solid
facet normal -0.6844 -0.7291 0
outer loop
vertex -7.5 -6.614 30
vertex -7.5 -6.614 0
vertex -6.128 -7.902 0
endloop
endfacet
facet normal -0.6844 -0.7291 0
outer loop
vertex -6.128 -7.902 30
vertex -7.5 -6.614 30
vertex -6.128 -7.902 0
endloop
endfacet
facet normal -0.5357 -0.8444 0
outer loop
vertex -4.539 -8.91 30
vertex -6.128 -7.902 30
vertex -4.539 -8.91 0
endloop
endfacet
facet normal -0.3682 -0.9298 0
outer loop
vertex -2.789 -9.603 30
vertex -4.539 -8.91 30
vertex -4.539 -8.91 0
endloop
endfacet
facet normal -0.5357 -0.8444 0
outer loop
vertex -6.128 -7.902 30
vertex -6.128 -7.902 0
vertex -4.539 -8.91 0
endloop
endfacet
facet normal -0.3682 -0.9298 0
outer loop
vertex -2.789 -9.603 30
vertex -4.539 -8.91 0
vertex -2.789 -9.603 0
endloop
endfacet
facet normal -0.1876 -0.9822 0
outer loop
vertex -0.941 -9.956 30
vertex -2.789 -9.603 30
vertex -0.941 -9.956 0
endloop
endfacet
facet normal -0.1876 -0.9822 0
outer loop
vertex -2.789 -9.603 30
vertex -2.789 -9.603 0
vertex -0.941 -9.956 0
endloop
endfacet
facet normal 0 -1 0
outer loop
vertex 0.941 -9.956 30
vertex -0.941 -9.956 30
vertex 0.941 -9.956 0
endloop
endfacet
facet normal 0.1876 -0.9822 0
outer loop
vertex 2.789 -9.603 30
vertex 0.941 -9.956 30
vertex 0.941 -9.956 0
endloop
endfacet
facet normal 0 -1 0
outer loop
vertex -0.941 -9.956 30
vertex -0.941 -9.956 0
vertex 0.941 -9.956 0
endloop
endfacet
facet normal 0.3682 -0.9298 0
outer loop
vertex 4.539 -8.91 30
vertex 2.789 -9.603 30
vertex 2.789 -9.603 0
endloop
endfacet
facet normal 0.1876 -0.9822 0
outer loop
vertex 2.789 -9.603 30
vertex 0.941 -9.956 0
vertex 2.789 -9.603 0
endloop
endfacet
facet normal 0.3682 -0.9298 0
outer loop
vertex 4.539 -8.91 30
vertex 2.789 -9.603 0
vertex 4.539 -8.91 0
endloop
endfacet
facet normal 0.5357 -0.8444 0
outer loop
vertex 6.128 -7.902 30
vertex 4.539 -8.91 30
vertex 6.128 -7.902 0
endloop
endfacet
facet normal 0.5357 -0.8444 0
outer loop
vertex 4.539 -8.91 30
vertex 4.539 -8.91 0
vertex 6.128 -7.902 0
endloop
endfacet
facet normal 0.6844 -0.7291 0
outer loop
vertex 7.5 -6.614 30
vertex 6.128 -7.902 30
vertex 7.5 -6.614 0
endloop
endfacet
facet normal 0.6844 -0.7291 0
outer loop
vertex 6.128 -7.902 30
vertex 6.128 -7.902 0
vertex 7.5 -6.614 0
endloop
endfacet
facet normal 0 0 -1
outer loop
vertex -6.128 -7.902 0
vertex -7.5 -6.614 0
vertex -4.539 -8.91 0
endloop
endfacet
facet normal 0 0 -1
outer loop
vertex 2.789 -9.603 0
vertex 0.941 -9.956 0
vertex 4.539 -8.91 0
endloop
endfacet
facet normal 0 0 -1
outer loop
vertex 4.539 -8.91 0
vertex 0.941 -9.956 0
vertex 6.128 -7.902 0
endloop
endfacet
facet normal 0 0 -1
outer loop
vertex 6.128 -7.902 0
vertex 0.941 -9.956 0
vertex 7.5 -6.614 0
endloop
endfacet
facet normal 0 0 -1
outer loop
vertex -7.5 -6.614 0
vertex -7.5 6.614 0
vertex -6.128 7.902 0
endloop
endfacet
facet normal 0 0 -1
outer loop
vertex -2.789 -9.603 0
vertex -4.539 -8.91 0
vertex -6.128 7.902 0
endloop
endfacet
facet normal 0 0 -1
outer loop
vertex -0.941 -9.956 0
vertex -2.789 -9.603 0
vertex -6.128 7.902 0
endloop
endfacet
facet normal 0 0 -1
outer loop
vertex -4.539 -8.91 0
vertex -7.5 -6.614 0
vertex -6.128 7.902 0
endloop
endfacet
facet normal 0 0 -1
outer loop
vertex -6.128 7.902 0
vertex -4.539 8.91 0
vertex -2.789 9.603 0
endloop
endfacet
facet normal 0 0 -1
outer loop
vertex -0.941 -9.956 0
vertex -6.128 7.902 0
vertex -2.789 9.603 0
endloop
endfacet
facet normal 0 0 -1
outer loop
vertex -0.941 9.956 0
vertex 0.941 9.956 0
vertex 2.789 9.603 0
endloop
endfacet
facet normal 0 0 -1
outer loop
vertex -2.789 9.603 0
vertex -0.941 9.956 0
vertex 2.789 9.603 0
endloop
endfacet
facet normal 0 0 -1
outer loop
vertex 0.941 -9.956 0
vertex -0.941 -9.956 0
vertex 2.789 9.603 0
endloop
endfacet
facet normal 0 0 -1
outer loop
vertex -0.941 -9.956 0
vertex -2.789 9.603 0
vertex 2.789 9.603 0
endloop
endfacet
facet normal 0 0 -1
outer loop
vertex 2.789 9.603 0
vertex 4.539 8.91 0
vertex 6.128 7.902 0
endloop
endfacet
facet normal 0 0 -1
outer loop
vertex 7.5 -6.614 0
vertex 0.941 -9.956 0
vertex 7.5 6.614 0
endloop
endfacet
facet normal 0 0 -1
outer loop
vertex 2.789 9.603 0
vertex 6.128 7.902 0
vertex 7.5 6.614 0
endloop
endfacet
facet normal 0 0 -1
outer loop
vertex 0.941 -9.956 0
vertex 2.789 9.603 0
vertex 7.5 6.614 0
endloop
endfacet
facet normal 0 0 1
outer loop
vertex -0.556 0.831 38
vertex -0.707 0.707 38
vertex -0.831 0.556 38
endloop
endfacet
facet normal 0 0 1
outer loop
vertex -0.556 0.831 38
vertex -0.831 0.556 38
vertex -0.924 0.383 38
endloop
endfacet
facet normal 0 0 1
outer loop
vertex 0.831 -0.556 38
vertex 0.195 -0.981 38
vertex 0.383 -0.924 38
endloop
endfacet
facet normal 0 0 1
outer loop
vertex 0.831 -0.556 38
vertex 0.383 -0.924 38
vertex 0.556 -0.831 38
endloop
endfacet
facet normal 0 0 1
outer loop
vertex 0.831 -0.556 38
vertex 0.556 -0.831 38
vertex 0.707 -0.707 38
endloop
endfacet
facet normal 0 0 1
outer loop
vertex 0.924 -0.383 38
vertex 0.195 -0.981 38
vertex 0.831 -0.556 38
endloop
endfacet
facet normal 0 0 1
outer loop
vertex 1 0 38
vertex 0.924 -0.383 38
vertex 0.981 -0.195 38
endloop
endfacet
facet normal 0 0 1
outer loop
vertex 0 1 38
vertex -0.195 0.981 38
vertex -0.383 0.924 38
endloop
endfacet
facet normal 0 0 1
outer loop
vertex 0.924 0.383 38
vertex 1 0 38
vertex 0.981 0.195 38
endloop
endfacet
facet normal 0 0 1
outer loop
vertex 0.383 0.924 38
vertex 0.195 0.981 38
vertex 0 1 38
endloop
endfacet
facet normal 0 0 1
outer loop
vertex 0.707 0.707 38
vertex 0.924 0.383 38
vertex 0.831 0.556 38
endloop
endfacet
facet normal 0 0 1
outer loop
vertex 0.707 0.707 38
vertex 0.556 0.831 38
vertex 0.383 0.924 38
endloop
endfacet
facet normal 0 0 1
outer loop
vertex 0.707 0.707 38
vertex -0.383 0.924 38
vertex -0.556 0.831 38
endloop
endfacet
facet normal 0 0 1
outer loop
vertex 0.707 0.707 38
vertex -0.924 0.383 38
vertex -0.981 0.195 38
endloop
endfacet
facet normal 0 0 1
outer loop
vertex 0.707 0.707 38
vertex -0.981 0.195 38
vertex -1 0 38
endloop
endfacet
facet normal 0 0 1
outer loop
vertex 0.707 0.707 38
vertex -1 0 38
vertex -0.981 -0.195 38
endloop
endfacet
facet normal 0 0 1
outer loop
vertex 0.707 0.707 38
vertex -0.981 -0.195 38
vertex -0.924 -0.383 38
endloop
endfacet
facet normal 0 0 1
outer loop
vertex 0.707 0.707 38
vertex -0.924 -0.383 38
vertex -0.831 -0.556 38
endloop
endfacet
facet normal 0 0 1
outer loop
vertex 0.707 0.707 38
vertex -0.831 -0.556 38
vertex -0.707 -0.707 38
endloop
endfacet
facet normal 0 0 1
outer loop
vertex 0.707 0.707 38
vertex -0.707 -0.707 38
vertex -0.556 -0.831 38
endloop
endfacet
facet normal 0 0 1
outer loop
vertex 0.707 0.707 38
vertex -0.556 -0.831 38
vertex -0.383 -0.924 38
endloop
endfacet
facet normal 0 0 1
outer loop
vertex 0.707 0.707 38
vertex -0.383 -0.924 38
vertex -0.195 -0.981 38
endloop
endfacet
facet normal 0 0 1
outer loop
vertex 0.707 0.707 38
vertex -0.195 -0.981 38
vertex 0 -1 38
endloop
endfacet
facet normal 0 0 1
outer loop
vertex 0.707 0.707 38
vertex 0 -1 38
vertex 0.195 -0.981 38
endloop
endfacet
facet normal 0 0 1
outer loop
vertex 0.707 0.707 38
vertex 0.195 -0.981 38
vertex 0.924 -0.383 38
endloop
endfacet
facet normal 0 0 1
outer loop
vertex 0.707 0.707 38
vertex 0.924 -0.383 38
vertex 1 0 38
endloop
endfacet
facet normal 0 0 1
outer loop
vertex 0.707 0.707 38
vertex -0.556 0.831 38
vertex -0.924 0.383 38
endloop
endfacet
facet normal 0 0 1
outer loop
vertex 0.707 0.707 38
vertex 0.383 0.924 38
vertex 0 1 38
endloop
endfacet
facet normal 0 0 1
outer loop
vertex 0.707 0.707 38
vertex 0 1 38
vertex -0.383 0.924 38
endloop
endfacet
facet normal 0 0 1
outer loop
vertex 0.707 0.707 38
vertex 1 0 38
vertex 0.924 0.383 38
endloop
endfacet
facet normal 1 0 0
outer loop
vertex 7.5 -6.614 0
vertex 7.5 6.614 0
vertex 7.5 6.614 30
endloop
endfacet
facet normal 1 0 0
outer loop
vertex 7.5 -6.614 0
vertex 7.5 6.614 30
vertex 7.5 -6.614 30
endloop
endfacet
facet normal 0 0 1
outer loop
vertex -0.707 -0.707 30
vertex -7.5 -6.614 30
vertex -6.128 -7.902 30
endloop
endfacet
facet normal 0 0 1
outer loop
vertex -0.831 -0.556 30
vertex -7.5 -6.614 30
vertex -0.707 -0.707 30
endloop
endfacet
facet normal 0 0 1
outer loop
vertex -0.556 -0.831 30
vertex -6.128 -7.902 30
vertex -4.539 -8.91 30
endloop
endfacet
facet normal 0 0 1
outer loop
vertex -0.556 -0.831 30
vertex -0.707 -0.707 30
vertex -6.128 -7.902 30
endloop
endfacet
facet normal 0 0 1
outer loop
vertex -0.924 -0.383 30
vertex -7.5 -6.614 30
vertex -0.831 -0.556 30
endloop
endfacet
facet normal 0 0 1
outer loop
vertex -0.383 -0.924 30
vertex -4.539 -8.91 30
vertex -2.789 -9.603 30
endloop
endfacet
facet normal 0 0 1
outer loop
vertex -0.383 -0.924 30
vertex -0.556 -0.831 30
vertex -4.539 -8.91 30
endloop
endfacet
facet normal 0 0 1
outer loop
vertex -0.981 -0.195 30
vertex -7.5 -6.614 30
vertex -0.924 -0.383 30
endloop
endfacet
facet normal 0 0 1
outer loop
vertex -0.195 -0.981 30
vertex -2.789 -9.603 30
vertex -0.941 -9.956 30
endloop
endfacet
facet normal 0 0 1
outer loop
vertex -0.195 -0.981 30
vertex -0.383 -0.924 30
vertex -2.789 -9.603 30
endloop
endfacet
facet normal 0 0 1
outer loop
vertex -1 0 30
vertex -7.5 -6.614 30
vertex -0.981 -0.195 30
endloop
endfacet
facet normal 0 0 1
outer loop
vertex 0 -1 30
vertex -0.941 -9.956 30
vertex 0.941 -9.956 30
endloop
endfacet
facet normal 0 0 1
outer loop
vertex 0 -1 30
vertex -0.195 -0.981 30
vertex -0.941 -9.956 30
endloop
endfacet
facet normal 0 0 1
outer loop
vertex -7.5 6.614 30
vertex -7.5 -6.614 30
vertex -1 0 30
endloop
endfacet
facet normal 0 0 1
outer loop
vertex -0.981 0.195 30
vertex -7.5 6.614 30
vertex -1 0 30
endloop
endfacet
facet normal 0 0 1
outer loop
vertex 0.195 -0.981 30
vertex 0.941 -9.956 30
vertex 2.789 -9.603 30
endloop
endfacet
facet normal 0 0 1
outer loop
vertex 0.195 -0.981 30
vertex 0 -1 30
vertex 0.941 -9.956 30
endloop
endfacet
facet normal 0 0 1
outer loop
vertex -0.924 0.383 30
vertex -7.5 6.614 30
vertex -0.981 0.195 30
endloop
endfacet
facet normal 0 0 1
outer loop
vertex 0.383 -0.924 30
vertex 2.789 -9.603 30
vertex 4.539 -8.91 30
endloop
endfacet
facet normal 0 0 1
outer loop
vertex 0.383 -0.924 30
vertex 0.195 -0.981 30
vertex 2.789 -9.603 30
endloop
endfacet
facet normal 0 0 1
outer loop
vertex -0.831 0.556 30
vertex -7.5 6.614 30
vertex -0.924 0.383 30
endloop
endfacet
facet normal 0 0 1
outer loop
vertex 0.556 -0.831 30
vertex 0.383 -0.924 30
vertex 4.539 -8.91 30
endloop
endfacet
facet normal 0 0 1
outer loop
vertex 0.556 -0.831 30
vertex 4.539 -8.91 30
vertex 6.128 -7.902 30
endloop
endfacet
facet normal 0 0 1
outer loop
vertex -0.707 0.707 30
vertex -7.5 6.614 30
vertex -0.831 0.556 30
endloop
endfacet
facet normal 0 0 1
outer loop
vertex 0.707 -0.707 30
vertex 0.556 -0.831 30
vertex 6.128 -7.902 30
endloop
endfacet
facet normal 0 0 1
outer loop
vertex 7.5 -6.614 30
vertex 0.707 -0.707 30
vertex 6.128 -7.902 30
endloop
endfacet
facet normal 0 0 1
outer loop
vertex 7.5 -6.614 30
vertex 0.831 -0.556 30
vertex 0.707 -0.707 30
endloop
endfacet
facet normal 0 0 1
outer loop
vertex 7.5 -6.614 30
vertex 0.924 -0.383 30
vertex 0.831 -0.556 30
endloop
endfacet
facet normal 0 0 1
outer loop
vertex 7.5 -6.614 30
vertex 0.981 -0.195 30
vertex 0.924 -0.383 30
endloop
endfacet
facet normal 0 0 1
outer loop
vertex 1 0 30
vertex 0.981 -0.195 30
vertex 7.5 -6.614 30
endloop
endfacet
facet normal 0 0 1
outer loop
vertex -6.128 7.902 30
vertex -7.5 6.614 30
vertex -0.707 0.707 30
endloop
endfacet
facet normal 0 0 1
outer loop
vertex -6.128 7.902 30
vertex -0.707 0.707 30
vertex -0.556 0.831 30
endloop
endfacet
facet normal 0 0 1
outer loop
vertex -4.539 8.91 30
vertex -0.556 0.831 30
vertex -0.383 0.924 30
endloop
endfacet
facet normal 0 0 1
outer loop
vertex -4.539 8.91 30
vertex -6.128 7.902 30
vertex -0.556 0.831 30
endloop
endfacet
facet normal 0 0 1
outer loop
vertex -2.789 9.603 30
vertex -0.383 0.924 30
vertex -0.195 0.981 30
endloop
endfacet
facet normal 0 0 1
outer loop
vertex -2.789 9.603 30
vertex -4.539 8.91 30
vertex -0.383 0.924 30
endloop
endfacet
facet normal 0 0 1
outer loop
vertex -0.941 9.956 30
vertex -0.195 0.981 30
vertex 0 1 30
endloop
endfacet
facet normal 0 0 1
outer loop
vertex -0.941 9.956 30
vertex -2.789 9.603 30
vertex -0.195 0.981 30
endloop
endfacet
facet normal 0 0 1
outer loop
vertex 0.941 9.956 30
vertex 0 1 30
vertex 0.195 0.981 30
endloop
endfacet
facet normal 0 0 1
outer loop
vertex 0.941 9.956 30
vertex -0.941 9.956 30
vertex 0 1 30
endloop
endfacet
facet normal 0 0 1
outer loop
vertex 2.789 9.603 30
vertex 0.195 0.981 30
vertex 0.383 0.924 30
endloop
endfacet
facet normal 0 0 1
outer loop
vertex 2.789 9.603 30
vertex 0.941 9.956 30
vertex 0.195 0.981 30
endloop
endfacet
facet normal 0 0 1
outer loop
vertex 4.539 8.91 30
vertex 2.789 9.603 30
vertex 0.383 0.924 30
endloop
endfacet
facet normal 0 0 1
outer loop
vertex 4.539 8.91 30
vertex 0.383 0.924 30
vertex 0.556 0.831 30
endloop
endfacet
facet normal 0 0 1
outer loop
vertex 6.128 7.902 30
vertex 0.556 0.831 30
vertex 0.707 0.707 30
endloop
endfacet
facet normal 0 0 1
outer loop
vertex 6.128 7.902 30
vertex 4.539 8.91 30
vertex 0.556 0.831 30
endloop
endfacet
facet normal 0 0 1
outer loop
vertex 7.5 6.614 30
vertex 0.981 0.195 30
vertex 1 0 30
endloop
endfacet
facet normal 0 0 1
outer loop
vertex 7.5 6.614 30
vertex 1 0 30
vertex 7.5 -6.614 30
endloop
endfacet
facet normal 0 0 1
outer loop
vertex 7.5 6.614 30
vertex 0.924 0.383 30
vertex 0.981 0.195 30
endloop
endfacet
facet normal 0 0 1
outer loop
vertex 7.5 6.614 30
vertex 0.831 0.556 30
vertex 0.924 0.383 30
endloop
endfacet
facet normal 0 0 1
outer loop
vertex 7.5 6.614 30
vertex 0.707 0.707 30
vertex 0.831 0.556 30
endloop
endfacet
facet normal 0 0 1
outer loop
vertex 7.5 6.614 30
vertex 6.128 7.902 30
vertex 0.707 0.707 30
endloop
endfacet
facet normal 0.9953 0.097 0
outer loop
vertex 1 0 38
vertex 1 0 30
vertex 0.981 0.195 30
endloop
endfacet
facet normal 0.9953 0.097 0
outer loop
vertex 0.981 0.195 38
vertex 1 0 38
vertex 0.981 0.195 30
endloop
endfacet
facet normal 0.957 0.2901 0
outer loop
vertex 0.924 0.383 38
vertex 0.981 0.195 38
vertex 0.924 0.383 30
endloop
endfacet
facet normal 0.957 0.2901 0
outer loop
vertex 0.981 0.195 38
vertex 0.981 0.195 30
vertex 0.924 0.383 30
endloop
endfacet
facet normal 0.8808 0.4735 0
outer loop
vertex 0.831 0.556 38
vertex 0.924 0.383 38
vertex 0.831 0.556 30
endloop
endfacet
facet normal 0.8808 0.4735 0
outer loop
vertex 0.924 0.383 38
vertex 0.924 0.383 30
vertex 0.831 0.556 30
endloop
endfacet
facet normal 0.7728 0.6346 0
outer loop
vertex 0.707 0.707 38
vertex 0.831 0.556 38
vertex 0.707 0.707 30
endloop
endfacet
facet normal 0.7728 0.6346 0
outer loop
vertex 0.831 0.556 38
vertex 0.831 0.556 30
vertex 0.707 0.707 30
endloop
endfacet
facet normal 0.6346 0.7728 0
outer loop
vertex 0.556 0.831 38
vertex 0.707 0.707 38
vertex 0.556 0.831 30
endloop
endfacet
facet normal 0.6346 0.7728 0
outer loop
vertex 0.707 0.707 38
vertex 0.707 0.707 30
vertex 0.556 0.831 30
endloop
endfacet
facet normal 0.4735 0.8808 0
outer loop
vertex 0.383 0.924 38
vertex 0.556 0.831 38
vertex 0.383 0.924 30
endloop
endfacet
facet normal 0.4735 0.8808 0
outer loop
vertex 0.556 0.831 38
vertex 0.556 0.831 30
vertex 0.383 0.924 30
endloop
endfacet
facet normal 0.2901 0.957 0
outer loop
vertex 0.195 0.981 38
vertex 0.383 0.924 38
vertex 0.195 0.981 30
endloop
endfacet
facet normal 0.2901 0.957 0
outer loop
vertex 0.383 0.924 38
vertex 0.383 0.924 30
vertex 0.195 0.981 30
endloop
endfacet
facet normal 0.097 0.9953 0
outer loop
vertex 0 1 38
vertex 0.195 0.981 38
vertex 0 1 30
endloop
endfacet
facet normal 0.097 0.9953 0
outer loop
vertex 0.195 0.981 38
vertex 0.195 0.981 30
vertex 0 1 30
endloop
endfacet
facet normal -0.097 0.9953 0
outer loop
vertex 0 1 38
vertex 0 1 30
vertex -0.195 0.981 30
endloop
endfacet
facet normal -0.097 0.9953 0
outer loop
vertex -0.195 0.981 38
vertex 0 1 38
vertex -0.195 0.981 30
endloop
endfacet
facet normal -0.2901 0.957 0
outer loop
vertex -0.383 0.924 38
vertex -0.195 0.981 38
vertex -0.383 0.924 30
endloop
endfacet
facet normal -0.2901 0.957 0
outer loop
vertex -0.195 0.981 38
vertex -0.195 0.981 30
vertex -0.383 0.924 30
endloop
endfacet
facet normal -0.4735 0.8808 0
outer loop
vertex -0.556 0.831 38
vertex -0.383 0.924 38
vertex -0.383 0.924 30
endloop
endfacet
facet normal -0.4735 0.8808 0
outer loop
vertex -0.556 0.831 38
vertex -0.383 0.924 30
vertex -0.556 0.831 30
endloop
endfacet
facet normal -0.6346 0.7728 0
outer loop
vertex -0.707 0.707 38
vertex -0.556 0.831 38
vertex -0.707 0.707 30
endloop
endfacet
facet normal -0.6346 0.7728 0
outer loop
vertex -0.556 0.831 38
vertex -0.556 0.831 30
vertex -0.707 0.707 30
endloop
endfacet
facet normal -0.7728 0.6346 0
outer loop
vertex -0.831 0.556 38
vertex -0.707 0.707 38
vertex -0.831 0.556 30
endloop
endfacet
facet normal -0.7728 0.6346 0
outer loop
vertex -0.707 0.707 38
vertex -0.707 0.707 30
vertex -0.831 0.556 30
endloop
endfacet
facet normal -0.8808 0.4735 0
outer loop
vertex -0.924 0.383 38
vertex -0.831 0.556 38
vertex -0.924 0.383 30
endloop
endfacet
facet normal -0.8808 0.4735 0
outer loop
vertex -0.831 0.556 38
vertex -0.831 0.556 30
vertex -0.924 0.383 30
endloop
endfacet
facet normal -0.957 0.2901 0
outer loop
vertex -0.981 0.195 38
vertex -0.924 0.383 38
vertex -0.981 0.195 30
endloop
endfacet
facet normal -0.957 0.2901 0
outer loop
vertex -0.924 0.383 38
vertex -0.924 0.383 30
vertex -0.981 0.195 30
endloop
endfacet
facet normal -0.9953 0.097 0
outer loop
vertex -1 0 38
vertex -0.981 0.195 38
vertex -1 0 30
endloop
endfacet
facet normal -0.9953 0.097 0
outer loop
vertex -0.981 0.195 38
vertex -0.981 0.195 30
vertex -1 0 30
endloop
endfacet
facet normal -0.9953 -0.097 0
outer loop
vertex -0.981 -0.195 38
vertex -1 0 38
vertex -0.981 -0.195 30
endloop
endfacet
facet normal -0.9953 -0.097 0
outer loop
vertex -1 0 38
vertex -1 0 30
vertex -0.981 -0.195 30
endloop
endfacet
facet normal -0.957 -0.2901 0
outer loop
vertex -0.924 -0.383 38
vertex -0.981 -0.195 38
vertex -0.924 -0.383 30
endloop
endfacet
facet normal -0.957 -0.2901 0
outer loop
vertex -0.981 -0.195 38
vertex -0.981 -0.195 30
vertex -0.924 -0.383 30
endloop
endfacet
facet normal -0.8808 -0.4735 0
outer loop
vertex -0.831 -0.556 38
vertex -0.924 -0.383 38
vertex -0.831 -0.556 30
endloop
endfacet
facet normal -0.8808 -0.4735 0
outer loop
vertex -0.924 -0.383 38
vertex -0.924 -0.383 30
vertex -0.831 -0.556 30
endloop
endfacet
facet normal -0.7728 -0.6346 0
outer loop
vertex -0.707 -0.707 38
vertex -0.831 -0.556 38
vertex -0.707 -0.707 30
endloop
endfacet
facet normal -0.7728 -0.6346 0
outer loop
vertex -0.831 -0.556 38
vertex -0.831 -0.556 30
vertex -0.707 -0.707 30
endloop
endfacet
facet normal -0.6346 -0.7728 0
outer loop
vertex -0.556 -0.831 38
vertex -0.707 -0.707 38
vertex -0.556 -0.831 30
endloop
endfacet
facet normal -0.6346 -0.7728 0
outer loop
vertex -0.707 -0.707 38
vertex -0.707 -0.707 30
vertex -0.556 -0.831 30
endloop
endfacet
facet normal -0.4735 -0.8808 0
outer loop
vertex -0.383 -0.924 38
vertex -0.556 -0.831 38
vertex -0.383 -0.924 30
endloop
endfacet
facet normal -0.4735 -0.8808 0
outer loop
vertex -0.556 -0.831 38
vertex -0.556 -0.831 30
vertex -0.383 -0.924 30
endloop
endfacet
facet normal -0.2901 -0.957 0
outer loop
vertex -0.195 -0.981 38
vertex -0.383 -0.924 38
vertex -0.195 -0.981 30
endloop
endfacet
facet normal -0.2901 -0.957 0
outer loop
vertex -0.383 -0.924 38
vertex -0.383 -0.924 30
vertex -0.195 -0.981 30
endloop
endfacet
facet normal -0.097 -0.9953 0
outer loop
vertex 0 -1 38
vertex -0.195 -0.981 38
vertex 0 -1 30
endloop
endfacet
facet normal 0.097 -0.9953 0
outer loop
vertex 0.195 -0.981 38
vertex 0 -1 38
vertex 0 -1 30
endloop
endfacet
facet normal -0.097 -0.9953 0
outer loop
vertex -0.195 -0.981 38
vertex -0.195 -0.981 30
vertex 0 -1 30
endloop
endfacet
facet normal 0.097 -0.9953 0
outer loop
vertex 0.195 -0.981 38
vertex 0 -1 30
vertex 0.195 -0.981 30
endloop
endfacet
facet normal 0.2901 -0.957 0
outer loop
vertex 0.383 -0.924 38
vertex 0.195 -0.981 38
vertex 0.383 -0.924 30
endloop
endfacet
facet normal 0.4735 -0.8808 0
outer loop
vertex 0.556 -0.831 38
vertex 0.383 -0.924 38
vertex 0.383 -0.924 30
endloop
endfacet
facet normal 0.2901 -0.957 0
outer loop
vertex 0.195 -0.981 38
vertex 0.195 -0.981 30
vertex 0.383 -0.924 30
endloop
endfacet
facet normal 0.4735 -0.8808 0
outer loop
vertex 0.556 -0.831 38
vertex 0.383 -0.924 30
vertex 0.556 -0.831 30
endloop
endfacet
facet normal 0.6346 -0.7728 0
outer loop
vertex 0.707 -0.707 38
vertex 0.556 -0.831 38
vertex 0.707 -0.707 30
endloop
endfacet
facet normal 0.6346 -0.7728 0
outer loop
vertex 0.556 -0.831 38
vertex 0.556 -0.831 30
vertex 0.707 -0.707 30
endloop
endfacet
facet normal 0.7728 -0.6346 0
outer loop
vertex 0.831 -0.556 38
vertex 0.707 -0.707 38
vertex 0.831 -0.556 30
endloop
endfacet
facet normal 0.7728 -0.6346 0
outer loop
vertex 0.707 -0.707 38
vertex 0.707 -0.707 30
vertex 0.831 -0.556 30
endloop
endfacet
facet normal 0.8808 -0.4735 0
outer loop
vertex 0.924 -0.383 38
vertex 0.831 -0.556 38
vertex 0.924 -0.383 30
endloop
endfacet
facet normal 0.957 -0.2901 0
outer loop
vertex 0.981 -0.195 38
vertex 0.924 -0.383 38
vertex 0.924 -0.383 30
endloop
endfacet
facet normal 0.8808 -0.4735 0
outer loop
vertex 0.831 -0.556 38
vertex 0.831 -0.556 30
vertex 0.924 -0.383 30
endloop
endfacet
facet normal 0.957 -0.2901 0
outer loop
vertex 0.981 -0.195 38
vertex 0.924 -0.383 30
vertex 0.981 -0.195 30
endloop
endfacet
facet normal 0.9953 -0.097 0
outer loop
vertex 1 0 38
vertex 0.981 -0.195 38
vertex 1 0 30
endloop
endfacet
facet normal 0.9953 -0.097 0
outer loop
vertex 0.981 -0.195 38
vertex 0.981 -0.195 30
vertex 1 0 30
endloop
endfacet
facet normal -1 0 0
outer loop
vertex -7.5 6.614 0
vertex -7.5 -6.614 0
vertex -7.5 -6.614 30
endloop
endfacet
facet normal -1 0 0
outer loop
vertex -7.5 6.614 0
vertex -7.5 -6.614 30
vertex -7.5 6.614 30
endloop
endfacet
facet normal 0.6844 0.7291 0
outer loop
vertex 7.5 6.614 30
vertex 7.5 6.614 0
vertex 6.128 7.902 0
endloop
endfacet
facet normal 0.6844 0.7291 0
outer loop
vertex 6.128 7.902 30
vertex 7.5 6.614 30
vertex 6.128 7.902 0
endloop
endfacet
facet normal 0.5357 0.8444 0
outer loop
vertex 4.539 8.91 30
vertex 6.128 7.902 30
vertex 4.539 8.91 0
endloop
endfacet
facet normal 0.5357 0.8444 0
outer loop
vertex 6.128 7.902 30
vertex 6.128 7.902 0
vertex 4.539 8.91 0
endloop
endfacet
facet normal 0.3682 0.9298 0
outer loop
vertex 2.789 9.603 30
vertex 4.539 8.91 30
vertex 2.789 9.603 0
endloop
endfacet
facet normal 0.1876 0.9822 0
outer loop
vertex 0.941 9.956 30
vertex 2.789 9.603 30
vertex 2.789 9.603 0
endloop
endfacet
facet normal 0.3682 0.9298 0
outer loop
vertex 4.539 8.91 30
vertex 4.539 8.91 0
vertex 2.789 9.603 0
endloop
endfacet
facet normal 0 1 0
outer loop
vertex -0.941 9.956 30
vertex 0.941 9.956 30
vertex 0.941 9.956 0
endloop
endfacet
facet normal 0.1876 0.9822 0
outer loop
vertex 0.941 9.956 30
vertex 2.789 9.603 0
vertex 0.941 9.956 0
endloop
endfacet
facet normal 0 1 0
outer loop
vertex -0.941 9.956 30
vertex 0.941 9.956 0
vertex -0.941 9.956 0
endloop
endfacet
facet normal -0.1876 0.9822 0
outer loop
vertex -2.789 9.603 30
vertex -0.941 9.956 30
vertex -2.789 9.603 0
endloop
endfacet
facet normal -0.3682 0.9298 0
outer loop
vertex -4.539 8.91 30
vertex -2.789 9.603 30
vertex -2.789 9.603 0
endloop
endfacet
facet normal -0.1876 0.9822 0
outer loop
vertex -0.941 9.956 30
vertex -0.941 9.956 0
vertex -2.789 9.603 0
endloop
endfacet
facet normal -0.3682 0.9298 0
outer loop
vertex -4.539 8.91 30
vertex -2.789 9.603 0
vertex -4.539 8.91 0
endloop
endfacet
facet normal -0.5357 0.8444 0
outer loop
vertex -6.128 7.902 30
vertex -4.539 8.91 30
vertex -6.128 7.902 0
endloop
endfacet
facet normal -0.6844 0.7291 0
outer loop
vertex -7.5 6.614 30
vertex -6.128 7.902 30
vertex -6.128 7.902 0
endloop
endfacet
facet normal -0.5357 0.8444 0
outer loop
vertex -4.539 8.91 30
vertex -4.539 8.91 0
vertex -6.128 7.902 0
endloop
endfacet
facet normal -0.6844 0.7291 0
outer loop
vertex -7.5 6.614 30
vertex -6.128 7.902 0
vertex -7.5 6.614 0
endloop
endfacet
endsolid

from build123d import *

# Parameters (mm, degrees)
SKETCH_1_R          = 10
EXTRUDE_1_DEPTH     = 30
CUT_EXTRUDE_1_DEPTH = 30
SKETCH_3_R          = 1
EXTRUDE_2_DEPTH     = 8


with BuildPart() as part:
    # 草图1 → 凸台-拉伸1 (new body)
    with BuildSketch(Plane.XY):
        Circle(SKETCH_1_R)
    extrude(amount=EXTRUDE_1_DEPTH)

    # 草图2 → 切除-拉伸1 (cut)
    with BuildSketch(Plane.XY.offset(30)):
        with BuildLine():
            ThreePointArc((10, 0), (9.354143467, 3.535533906), (7.5, 6.614378278))
            Line((7.5, 6.614378278), (7.5, -6.614378278))
            ThreePointArc((7.5, -6.614378278), (9.354143467, -3.535533906), (10, 0))
        make_face()
        with BuildLine():
            Line((-7.5, -6.614378278), (-7.5, 6.614378278))
            ThreePointArc((-7.5, 6.614378278), (-10, 0), (-7.5, -6.614378278))
        make_face()
    extrude(amount=-CUT_EXTRUDE_1_DEPTH, mode=Mode.SUBTRACT)

    # 草图3 → 凸台-拉伸2 (add)
    with BuildSketch(Plane.XY.offset(30)):
        Circle(SKETCH_3_R)
    extrude(amount=EXTRUDE_2_DEPTH)


solid = part.part
